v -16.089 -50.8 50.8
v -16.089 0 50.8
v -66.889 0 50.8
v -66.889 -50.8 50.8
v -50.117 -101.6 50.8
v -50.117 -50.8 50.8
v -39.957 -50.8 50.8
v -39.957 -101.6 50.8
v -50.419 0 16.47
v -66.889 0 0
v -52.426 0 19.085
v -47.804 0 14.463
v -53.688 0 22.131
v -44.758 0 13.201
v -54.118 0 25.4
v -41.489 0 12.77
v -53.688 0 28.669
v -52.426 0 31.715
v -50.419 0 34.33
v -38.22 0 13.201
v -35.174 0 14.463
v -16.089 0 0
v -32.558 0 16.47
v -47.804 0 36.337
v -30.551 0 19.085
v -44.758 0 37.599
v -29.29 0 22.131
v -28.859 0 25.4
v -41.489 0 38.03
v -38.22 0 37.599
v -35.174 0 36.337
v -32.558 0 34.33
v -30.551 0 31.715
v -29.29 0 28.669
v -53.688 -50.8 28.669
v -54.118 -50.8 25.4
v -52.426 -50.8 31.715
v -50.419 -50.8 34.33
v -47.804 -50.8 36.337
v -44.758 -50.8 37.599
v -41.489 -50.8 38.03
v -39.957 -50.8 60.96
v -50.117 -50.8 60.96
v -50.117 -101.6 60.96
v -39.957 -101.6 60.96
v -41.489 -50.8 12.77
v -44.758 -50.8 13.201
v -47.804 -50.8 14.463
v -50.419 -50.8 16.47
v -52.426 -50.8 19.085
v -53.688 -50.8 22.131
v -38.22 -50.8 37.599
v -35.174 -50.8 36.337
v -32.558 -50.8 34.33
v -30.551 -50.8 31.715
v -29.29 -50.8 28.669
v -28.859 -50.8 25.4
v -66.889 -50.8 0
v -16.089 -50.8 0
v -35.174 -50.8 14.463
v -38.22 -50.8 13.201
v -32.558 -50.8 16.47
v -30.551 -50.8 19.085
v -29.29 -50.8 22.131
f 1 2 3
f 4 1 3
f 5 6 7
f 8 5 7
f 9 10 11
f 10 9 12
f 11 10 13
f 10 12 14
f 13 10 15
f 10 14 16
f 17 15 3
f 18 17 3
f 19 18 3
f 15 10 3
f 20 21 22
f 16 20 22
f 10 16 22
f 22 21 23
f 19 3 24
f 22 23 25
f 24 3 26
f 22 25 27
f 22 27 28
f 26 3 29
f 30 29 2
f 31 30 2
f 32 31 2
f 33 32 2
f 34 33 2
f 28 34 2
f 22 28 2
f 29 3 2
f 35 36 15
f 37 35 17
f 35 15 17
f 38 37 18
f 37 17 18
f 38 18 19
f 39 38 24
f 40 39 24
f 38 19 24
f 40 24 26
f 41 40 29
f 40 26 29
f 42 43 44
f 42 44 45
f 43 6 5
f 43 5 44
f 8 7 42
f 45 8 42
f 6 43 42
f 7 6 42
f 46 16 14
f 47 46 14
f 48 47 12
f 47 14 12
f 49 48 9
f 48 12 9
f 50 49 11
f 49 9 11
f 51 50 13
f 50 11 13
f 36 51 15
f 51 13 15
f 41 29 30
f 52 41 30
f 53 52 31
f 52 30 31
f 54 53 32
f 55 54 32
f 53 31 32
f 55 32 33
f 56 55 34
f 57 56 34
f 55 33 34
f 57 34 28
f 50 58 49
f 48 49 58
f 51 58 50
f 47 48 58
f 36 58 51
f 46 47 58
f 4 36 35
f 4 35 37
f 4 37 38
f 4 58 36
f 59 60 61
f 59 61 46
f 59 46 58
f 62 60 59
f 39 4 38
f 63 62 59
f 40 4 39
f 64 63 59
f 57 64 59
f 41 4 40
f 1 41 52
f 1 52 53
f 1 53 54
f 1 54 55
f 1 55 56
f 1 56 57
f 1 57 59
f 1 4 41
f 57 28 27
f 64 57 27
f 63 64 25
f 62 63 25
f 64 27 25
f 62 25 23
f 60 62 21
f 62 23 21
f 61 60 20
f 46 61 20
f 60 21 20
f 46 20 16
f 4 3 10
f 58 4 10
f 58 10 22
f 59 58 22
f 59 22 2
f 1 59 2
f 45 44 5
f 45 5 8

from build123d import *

# Parameters (mm, degrees)
F1_DEPTH = 50.8
F2_W     = 10.16
F2_H     = 10.16
F3_DEPTH = 50.8


# Not quite as in the source:
# - a feature names something its author has since deleted; it is built from what else it names


with BuildPart() as f1:
    # F0 (on Front) → F1 (new body)
    with BuildSketch(Plane.XZ):
        with BuildLine():
            Line((-41.48875705, 50.8), (-66.88875705, 50.8))
            Line((-66.88875705, 50.8), (-66.88875705, 25.4))
            Line((-66.88875705, 25.4), (-54.1182633227, 25.4))
            ThreePointArc((-54.1182633227, 25.4), (-50.4191665784, 34.3304095284), (-41.48875705, 38.0295062726))
            Line((-41.48875705, 38.0295062726), (-41.48875705, 50.8))
        make_face()
        with BuildLine():
            Line((-54.1182633227, 25.4), (-66.88875705, 25.4))
            Line((-66.88875705, 25.4), (-66.88875705, 0))
            Line((-66.88875705, 0), (-41.48875705, 0))
            Line((-41.48875705, 0), (-41.48875705, 12.7704937274))
            ThreePointArc((-41.48875705, 12.7704937274), (-50.4191665784, 16.4695904716), (-54.1182633227, 25.4))
        make_face()
        with BuildLine():
            Line((-16.08875705, 50.8), (-41.48875705, 50.8))
            Line((-41.48875705, 50.8), (-41.48875705, 38.0295062726))
            ThreePointArc((-41.48875705, 38.0295062726), (-32.5583475216, 34.3304095284), (-28.8592507774, 25.4))
            Line((-28.8592507774, 25.4), (-16.08875705, 25.4))
            Line((-16.08875705, 25.4), (-16.08875705, 50.8))
        make_face()
        with BuildLine():
            Line((-41.48875705, 12.7704937274), (-41.48875705, 0))
            Line((-41.48875705, 0), (-16.08875705, 0))
            Line((-16.08875705, 0), (-16.08875705, 25.4))
            Line((-16.08875705, 25.4), (-28.8592507774, 25.4))
            ThreePointArc((-28.8592507774, 25.4), (-32.5583475216, 16.4695904716), (-41.48875705, 12.7704937274))
        make_face()
    extrude(amount=F1_DEPTH)


with BuildPart() as f3:
    # F2 (on face) → F3 (new body)
    with BuildSketch(Plane.XZ.offset(50.8)):
        with Locations((-45.037239356, 55.88)):
            Rectangle(F2_W, F2_H)
    extrude(amount=F3_DEPTH)


solid = Compound([f1.part, f3.part])
